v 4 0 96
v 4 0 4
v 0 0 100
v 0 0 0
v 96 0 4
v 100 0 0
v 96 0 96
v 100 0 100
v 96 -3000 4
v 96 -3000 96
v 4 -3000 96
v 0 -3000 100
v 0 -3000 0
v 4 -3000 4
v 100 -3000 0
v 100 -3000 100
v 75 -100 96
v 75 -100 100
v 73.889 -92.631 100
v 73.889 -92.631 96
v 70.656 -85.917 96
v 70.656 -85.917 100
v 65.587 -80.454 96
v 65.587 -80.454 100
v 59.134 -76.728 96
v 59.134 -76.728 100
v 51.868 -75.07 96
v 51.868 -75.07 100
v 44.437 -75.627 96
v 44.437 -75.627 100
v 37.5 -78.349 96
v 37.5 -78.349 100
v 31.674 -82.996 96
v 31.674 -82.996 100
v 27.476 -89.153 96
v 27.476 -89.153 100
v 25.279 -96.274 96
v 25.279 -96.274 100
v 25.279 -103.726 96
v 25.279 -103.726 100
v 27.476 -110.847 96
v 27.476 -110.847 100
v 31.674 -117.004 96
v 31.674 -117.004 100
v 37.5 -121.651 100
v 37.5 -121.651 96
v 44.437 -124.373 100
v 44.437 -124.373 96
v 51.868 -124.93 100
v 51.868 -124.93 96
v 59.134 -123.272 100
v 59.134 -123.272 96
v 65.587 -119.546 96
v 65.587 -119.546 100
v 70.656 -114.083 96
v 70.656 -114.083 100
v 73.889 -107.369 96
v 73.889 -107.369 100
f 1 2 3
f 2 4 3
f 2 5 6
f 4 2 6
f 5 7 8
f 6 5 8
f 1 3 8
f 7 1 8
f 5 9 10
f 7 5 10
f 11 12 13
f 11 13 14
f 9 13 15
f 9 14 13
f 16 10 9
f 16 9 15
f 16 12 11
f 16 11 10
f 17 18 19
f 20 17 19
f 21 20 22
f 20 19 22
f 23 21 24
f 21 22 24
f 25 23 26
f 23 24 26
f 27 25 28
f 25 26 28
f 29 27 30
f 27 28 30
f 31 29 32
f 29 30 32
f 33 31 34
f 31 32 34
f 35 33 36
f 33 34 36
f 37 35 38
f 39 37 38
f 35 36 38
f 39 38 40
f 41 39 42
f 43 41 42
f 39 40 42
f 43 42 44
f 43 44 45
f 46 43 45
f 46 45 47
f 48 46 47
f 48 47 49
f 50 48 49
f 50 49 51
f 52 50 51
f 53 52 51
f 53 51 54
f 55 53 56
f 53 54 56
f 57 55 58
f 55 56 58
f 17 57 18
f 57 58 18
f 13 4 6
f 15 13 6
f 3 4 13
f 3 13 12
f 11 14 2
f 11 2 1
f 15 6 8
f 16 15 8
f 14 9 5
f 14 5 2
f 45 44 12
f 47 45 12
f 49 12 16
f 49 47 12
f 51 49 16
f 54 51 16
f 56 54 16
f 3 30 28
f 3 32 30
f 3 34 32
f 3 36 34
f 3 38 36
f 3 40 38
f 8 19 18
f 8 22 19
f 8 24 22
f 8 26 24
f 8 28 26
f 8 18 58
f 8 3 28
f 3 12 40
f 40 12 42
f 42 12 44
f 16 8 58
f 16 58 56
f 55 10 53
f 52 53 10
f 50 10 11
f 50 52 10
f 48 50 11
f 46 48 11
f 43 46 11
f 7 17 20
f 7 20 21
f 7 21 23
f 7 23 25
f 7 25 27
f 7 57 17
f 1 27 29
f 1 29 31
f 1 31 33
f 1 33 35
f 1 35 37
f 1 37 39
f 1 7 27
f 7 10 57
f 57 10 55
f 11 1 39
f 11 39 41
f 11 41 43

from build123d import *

# Parameters (mm, degrees)
F0_W     = 100
F0_H     = 100
F1_DEPTH = 3000
F2_W     = 92
F2_H     = 92
F3_DEPTH = 3000.001
F4_R     = 25
F5_DEPTH = 4


with BuildPart() as f1:
    # F0 (on Front) → F1 (new body)
    with BuildSketch(Plane.XZ):
        with Locations((50, 50)):
            Rectangle(F0_W, F0_H)
    extrude(amount=F1_DEPTH)

    # F2 (on face) → F3 (cut, through all)
    with BuildSketch(Plane(origin=(0, 0, 0), x_dir=(-1, 0, 0), z_dir=(0, 1, 0))):
        with Locations((-50, 50)):
            Rectangle(F2_W, F2_H)
    extrude(amount=-F3_DEPTH, mode=Mode.SUBTRACT)

    # F4 (on face) → F5 (cut, through all)
    with BuildSketch(Plane.XY.offset(100)):
        with Locations((50, -100)):
            Circle(F4_R)
    extrude(amount=-F5_DEPTH, mode=Mode.SUBTRACT)


solid = f1.part
